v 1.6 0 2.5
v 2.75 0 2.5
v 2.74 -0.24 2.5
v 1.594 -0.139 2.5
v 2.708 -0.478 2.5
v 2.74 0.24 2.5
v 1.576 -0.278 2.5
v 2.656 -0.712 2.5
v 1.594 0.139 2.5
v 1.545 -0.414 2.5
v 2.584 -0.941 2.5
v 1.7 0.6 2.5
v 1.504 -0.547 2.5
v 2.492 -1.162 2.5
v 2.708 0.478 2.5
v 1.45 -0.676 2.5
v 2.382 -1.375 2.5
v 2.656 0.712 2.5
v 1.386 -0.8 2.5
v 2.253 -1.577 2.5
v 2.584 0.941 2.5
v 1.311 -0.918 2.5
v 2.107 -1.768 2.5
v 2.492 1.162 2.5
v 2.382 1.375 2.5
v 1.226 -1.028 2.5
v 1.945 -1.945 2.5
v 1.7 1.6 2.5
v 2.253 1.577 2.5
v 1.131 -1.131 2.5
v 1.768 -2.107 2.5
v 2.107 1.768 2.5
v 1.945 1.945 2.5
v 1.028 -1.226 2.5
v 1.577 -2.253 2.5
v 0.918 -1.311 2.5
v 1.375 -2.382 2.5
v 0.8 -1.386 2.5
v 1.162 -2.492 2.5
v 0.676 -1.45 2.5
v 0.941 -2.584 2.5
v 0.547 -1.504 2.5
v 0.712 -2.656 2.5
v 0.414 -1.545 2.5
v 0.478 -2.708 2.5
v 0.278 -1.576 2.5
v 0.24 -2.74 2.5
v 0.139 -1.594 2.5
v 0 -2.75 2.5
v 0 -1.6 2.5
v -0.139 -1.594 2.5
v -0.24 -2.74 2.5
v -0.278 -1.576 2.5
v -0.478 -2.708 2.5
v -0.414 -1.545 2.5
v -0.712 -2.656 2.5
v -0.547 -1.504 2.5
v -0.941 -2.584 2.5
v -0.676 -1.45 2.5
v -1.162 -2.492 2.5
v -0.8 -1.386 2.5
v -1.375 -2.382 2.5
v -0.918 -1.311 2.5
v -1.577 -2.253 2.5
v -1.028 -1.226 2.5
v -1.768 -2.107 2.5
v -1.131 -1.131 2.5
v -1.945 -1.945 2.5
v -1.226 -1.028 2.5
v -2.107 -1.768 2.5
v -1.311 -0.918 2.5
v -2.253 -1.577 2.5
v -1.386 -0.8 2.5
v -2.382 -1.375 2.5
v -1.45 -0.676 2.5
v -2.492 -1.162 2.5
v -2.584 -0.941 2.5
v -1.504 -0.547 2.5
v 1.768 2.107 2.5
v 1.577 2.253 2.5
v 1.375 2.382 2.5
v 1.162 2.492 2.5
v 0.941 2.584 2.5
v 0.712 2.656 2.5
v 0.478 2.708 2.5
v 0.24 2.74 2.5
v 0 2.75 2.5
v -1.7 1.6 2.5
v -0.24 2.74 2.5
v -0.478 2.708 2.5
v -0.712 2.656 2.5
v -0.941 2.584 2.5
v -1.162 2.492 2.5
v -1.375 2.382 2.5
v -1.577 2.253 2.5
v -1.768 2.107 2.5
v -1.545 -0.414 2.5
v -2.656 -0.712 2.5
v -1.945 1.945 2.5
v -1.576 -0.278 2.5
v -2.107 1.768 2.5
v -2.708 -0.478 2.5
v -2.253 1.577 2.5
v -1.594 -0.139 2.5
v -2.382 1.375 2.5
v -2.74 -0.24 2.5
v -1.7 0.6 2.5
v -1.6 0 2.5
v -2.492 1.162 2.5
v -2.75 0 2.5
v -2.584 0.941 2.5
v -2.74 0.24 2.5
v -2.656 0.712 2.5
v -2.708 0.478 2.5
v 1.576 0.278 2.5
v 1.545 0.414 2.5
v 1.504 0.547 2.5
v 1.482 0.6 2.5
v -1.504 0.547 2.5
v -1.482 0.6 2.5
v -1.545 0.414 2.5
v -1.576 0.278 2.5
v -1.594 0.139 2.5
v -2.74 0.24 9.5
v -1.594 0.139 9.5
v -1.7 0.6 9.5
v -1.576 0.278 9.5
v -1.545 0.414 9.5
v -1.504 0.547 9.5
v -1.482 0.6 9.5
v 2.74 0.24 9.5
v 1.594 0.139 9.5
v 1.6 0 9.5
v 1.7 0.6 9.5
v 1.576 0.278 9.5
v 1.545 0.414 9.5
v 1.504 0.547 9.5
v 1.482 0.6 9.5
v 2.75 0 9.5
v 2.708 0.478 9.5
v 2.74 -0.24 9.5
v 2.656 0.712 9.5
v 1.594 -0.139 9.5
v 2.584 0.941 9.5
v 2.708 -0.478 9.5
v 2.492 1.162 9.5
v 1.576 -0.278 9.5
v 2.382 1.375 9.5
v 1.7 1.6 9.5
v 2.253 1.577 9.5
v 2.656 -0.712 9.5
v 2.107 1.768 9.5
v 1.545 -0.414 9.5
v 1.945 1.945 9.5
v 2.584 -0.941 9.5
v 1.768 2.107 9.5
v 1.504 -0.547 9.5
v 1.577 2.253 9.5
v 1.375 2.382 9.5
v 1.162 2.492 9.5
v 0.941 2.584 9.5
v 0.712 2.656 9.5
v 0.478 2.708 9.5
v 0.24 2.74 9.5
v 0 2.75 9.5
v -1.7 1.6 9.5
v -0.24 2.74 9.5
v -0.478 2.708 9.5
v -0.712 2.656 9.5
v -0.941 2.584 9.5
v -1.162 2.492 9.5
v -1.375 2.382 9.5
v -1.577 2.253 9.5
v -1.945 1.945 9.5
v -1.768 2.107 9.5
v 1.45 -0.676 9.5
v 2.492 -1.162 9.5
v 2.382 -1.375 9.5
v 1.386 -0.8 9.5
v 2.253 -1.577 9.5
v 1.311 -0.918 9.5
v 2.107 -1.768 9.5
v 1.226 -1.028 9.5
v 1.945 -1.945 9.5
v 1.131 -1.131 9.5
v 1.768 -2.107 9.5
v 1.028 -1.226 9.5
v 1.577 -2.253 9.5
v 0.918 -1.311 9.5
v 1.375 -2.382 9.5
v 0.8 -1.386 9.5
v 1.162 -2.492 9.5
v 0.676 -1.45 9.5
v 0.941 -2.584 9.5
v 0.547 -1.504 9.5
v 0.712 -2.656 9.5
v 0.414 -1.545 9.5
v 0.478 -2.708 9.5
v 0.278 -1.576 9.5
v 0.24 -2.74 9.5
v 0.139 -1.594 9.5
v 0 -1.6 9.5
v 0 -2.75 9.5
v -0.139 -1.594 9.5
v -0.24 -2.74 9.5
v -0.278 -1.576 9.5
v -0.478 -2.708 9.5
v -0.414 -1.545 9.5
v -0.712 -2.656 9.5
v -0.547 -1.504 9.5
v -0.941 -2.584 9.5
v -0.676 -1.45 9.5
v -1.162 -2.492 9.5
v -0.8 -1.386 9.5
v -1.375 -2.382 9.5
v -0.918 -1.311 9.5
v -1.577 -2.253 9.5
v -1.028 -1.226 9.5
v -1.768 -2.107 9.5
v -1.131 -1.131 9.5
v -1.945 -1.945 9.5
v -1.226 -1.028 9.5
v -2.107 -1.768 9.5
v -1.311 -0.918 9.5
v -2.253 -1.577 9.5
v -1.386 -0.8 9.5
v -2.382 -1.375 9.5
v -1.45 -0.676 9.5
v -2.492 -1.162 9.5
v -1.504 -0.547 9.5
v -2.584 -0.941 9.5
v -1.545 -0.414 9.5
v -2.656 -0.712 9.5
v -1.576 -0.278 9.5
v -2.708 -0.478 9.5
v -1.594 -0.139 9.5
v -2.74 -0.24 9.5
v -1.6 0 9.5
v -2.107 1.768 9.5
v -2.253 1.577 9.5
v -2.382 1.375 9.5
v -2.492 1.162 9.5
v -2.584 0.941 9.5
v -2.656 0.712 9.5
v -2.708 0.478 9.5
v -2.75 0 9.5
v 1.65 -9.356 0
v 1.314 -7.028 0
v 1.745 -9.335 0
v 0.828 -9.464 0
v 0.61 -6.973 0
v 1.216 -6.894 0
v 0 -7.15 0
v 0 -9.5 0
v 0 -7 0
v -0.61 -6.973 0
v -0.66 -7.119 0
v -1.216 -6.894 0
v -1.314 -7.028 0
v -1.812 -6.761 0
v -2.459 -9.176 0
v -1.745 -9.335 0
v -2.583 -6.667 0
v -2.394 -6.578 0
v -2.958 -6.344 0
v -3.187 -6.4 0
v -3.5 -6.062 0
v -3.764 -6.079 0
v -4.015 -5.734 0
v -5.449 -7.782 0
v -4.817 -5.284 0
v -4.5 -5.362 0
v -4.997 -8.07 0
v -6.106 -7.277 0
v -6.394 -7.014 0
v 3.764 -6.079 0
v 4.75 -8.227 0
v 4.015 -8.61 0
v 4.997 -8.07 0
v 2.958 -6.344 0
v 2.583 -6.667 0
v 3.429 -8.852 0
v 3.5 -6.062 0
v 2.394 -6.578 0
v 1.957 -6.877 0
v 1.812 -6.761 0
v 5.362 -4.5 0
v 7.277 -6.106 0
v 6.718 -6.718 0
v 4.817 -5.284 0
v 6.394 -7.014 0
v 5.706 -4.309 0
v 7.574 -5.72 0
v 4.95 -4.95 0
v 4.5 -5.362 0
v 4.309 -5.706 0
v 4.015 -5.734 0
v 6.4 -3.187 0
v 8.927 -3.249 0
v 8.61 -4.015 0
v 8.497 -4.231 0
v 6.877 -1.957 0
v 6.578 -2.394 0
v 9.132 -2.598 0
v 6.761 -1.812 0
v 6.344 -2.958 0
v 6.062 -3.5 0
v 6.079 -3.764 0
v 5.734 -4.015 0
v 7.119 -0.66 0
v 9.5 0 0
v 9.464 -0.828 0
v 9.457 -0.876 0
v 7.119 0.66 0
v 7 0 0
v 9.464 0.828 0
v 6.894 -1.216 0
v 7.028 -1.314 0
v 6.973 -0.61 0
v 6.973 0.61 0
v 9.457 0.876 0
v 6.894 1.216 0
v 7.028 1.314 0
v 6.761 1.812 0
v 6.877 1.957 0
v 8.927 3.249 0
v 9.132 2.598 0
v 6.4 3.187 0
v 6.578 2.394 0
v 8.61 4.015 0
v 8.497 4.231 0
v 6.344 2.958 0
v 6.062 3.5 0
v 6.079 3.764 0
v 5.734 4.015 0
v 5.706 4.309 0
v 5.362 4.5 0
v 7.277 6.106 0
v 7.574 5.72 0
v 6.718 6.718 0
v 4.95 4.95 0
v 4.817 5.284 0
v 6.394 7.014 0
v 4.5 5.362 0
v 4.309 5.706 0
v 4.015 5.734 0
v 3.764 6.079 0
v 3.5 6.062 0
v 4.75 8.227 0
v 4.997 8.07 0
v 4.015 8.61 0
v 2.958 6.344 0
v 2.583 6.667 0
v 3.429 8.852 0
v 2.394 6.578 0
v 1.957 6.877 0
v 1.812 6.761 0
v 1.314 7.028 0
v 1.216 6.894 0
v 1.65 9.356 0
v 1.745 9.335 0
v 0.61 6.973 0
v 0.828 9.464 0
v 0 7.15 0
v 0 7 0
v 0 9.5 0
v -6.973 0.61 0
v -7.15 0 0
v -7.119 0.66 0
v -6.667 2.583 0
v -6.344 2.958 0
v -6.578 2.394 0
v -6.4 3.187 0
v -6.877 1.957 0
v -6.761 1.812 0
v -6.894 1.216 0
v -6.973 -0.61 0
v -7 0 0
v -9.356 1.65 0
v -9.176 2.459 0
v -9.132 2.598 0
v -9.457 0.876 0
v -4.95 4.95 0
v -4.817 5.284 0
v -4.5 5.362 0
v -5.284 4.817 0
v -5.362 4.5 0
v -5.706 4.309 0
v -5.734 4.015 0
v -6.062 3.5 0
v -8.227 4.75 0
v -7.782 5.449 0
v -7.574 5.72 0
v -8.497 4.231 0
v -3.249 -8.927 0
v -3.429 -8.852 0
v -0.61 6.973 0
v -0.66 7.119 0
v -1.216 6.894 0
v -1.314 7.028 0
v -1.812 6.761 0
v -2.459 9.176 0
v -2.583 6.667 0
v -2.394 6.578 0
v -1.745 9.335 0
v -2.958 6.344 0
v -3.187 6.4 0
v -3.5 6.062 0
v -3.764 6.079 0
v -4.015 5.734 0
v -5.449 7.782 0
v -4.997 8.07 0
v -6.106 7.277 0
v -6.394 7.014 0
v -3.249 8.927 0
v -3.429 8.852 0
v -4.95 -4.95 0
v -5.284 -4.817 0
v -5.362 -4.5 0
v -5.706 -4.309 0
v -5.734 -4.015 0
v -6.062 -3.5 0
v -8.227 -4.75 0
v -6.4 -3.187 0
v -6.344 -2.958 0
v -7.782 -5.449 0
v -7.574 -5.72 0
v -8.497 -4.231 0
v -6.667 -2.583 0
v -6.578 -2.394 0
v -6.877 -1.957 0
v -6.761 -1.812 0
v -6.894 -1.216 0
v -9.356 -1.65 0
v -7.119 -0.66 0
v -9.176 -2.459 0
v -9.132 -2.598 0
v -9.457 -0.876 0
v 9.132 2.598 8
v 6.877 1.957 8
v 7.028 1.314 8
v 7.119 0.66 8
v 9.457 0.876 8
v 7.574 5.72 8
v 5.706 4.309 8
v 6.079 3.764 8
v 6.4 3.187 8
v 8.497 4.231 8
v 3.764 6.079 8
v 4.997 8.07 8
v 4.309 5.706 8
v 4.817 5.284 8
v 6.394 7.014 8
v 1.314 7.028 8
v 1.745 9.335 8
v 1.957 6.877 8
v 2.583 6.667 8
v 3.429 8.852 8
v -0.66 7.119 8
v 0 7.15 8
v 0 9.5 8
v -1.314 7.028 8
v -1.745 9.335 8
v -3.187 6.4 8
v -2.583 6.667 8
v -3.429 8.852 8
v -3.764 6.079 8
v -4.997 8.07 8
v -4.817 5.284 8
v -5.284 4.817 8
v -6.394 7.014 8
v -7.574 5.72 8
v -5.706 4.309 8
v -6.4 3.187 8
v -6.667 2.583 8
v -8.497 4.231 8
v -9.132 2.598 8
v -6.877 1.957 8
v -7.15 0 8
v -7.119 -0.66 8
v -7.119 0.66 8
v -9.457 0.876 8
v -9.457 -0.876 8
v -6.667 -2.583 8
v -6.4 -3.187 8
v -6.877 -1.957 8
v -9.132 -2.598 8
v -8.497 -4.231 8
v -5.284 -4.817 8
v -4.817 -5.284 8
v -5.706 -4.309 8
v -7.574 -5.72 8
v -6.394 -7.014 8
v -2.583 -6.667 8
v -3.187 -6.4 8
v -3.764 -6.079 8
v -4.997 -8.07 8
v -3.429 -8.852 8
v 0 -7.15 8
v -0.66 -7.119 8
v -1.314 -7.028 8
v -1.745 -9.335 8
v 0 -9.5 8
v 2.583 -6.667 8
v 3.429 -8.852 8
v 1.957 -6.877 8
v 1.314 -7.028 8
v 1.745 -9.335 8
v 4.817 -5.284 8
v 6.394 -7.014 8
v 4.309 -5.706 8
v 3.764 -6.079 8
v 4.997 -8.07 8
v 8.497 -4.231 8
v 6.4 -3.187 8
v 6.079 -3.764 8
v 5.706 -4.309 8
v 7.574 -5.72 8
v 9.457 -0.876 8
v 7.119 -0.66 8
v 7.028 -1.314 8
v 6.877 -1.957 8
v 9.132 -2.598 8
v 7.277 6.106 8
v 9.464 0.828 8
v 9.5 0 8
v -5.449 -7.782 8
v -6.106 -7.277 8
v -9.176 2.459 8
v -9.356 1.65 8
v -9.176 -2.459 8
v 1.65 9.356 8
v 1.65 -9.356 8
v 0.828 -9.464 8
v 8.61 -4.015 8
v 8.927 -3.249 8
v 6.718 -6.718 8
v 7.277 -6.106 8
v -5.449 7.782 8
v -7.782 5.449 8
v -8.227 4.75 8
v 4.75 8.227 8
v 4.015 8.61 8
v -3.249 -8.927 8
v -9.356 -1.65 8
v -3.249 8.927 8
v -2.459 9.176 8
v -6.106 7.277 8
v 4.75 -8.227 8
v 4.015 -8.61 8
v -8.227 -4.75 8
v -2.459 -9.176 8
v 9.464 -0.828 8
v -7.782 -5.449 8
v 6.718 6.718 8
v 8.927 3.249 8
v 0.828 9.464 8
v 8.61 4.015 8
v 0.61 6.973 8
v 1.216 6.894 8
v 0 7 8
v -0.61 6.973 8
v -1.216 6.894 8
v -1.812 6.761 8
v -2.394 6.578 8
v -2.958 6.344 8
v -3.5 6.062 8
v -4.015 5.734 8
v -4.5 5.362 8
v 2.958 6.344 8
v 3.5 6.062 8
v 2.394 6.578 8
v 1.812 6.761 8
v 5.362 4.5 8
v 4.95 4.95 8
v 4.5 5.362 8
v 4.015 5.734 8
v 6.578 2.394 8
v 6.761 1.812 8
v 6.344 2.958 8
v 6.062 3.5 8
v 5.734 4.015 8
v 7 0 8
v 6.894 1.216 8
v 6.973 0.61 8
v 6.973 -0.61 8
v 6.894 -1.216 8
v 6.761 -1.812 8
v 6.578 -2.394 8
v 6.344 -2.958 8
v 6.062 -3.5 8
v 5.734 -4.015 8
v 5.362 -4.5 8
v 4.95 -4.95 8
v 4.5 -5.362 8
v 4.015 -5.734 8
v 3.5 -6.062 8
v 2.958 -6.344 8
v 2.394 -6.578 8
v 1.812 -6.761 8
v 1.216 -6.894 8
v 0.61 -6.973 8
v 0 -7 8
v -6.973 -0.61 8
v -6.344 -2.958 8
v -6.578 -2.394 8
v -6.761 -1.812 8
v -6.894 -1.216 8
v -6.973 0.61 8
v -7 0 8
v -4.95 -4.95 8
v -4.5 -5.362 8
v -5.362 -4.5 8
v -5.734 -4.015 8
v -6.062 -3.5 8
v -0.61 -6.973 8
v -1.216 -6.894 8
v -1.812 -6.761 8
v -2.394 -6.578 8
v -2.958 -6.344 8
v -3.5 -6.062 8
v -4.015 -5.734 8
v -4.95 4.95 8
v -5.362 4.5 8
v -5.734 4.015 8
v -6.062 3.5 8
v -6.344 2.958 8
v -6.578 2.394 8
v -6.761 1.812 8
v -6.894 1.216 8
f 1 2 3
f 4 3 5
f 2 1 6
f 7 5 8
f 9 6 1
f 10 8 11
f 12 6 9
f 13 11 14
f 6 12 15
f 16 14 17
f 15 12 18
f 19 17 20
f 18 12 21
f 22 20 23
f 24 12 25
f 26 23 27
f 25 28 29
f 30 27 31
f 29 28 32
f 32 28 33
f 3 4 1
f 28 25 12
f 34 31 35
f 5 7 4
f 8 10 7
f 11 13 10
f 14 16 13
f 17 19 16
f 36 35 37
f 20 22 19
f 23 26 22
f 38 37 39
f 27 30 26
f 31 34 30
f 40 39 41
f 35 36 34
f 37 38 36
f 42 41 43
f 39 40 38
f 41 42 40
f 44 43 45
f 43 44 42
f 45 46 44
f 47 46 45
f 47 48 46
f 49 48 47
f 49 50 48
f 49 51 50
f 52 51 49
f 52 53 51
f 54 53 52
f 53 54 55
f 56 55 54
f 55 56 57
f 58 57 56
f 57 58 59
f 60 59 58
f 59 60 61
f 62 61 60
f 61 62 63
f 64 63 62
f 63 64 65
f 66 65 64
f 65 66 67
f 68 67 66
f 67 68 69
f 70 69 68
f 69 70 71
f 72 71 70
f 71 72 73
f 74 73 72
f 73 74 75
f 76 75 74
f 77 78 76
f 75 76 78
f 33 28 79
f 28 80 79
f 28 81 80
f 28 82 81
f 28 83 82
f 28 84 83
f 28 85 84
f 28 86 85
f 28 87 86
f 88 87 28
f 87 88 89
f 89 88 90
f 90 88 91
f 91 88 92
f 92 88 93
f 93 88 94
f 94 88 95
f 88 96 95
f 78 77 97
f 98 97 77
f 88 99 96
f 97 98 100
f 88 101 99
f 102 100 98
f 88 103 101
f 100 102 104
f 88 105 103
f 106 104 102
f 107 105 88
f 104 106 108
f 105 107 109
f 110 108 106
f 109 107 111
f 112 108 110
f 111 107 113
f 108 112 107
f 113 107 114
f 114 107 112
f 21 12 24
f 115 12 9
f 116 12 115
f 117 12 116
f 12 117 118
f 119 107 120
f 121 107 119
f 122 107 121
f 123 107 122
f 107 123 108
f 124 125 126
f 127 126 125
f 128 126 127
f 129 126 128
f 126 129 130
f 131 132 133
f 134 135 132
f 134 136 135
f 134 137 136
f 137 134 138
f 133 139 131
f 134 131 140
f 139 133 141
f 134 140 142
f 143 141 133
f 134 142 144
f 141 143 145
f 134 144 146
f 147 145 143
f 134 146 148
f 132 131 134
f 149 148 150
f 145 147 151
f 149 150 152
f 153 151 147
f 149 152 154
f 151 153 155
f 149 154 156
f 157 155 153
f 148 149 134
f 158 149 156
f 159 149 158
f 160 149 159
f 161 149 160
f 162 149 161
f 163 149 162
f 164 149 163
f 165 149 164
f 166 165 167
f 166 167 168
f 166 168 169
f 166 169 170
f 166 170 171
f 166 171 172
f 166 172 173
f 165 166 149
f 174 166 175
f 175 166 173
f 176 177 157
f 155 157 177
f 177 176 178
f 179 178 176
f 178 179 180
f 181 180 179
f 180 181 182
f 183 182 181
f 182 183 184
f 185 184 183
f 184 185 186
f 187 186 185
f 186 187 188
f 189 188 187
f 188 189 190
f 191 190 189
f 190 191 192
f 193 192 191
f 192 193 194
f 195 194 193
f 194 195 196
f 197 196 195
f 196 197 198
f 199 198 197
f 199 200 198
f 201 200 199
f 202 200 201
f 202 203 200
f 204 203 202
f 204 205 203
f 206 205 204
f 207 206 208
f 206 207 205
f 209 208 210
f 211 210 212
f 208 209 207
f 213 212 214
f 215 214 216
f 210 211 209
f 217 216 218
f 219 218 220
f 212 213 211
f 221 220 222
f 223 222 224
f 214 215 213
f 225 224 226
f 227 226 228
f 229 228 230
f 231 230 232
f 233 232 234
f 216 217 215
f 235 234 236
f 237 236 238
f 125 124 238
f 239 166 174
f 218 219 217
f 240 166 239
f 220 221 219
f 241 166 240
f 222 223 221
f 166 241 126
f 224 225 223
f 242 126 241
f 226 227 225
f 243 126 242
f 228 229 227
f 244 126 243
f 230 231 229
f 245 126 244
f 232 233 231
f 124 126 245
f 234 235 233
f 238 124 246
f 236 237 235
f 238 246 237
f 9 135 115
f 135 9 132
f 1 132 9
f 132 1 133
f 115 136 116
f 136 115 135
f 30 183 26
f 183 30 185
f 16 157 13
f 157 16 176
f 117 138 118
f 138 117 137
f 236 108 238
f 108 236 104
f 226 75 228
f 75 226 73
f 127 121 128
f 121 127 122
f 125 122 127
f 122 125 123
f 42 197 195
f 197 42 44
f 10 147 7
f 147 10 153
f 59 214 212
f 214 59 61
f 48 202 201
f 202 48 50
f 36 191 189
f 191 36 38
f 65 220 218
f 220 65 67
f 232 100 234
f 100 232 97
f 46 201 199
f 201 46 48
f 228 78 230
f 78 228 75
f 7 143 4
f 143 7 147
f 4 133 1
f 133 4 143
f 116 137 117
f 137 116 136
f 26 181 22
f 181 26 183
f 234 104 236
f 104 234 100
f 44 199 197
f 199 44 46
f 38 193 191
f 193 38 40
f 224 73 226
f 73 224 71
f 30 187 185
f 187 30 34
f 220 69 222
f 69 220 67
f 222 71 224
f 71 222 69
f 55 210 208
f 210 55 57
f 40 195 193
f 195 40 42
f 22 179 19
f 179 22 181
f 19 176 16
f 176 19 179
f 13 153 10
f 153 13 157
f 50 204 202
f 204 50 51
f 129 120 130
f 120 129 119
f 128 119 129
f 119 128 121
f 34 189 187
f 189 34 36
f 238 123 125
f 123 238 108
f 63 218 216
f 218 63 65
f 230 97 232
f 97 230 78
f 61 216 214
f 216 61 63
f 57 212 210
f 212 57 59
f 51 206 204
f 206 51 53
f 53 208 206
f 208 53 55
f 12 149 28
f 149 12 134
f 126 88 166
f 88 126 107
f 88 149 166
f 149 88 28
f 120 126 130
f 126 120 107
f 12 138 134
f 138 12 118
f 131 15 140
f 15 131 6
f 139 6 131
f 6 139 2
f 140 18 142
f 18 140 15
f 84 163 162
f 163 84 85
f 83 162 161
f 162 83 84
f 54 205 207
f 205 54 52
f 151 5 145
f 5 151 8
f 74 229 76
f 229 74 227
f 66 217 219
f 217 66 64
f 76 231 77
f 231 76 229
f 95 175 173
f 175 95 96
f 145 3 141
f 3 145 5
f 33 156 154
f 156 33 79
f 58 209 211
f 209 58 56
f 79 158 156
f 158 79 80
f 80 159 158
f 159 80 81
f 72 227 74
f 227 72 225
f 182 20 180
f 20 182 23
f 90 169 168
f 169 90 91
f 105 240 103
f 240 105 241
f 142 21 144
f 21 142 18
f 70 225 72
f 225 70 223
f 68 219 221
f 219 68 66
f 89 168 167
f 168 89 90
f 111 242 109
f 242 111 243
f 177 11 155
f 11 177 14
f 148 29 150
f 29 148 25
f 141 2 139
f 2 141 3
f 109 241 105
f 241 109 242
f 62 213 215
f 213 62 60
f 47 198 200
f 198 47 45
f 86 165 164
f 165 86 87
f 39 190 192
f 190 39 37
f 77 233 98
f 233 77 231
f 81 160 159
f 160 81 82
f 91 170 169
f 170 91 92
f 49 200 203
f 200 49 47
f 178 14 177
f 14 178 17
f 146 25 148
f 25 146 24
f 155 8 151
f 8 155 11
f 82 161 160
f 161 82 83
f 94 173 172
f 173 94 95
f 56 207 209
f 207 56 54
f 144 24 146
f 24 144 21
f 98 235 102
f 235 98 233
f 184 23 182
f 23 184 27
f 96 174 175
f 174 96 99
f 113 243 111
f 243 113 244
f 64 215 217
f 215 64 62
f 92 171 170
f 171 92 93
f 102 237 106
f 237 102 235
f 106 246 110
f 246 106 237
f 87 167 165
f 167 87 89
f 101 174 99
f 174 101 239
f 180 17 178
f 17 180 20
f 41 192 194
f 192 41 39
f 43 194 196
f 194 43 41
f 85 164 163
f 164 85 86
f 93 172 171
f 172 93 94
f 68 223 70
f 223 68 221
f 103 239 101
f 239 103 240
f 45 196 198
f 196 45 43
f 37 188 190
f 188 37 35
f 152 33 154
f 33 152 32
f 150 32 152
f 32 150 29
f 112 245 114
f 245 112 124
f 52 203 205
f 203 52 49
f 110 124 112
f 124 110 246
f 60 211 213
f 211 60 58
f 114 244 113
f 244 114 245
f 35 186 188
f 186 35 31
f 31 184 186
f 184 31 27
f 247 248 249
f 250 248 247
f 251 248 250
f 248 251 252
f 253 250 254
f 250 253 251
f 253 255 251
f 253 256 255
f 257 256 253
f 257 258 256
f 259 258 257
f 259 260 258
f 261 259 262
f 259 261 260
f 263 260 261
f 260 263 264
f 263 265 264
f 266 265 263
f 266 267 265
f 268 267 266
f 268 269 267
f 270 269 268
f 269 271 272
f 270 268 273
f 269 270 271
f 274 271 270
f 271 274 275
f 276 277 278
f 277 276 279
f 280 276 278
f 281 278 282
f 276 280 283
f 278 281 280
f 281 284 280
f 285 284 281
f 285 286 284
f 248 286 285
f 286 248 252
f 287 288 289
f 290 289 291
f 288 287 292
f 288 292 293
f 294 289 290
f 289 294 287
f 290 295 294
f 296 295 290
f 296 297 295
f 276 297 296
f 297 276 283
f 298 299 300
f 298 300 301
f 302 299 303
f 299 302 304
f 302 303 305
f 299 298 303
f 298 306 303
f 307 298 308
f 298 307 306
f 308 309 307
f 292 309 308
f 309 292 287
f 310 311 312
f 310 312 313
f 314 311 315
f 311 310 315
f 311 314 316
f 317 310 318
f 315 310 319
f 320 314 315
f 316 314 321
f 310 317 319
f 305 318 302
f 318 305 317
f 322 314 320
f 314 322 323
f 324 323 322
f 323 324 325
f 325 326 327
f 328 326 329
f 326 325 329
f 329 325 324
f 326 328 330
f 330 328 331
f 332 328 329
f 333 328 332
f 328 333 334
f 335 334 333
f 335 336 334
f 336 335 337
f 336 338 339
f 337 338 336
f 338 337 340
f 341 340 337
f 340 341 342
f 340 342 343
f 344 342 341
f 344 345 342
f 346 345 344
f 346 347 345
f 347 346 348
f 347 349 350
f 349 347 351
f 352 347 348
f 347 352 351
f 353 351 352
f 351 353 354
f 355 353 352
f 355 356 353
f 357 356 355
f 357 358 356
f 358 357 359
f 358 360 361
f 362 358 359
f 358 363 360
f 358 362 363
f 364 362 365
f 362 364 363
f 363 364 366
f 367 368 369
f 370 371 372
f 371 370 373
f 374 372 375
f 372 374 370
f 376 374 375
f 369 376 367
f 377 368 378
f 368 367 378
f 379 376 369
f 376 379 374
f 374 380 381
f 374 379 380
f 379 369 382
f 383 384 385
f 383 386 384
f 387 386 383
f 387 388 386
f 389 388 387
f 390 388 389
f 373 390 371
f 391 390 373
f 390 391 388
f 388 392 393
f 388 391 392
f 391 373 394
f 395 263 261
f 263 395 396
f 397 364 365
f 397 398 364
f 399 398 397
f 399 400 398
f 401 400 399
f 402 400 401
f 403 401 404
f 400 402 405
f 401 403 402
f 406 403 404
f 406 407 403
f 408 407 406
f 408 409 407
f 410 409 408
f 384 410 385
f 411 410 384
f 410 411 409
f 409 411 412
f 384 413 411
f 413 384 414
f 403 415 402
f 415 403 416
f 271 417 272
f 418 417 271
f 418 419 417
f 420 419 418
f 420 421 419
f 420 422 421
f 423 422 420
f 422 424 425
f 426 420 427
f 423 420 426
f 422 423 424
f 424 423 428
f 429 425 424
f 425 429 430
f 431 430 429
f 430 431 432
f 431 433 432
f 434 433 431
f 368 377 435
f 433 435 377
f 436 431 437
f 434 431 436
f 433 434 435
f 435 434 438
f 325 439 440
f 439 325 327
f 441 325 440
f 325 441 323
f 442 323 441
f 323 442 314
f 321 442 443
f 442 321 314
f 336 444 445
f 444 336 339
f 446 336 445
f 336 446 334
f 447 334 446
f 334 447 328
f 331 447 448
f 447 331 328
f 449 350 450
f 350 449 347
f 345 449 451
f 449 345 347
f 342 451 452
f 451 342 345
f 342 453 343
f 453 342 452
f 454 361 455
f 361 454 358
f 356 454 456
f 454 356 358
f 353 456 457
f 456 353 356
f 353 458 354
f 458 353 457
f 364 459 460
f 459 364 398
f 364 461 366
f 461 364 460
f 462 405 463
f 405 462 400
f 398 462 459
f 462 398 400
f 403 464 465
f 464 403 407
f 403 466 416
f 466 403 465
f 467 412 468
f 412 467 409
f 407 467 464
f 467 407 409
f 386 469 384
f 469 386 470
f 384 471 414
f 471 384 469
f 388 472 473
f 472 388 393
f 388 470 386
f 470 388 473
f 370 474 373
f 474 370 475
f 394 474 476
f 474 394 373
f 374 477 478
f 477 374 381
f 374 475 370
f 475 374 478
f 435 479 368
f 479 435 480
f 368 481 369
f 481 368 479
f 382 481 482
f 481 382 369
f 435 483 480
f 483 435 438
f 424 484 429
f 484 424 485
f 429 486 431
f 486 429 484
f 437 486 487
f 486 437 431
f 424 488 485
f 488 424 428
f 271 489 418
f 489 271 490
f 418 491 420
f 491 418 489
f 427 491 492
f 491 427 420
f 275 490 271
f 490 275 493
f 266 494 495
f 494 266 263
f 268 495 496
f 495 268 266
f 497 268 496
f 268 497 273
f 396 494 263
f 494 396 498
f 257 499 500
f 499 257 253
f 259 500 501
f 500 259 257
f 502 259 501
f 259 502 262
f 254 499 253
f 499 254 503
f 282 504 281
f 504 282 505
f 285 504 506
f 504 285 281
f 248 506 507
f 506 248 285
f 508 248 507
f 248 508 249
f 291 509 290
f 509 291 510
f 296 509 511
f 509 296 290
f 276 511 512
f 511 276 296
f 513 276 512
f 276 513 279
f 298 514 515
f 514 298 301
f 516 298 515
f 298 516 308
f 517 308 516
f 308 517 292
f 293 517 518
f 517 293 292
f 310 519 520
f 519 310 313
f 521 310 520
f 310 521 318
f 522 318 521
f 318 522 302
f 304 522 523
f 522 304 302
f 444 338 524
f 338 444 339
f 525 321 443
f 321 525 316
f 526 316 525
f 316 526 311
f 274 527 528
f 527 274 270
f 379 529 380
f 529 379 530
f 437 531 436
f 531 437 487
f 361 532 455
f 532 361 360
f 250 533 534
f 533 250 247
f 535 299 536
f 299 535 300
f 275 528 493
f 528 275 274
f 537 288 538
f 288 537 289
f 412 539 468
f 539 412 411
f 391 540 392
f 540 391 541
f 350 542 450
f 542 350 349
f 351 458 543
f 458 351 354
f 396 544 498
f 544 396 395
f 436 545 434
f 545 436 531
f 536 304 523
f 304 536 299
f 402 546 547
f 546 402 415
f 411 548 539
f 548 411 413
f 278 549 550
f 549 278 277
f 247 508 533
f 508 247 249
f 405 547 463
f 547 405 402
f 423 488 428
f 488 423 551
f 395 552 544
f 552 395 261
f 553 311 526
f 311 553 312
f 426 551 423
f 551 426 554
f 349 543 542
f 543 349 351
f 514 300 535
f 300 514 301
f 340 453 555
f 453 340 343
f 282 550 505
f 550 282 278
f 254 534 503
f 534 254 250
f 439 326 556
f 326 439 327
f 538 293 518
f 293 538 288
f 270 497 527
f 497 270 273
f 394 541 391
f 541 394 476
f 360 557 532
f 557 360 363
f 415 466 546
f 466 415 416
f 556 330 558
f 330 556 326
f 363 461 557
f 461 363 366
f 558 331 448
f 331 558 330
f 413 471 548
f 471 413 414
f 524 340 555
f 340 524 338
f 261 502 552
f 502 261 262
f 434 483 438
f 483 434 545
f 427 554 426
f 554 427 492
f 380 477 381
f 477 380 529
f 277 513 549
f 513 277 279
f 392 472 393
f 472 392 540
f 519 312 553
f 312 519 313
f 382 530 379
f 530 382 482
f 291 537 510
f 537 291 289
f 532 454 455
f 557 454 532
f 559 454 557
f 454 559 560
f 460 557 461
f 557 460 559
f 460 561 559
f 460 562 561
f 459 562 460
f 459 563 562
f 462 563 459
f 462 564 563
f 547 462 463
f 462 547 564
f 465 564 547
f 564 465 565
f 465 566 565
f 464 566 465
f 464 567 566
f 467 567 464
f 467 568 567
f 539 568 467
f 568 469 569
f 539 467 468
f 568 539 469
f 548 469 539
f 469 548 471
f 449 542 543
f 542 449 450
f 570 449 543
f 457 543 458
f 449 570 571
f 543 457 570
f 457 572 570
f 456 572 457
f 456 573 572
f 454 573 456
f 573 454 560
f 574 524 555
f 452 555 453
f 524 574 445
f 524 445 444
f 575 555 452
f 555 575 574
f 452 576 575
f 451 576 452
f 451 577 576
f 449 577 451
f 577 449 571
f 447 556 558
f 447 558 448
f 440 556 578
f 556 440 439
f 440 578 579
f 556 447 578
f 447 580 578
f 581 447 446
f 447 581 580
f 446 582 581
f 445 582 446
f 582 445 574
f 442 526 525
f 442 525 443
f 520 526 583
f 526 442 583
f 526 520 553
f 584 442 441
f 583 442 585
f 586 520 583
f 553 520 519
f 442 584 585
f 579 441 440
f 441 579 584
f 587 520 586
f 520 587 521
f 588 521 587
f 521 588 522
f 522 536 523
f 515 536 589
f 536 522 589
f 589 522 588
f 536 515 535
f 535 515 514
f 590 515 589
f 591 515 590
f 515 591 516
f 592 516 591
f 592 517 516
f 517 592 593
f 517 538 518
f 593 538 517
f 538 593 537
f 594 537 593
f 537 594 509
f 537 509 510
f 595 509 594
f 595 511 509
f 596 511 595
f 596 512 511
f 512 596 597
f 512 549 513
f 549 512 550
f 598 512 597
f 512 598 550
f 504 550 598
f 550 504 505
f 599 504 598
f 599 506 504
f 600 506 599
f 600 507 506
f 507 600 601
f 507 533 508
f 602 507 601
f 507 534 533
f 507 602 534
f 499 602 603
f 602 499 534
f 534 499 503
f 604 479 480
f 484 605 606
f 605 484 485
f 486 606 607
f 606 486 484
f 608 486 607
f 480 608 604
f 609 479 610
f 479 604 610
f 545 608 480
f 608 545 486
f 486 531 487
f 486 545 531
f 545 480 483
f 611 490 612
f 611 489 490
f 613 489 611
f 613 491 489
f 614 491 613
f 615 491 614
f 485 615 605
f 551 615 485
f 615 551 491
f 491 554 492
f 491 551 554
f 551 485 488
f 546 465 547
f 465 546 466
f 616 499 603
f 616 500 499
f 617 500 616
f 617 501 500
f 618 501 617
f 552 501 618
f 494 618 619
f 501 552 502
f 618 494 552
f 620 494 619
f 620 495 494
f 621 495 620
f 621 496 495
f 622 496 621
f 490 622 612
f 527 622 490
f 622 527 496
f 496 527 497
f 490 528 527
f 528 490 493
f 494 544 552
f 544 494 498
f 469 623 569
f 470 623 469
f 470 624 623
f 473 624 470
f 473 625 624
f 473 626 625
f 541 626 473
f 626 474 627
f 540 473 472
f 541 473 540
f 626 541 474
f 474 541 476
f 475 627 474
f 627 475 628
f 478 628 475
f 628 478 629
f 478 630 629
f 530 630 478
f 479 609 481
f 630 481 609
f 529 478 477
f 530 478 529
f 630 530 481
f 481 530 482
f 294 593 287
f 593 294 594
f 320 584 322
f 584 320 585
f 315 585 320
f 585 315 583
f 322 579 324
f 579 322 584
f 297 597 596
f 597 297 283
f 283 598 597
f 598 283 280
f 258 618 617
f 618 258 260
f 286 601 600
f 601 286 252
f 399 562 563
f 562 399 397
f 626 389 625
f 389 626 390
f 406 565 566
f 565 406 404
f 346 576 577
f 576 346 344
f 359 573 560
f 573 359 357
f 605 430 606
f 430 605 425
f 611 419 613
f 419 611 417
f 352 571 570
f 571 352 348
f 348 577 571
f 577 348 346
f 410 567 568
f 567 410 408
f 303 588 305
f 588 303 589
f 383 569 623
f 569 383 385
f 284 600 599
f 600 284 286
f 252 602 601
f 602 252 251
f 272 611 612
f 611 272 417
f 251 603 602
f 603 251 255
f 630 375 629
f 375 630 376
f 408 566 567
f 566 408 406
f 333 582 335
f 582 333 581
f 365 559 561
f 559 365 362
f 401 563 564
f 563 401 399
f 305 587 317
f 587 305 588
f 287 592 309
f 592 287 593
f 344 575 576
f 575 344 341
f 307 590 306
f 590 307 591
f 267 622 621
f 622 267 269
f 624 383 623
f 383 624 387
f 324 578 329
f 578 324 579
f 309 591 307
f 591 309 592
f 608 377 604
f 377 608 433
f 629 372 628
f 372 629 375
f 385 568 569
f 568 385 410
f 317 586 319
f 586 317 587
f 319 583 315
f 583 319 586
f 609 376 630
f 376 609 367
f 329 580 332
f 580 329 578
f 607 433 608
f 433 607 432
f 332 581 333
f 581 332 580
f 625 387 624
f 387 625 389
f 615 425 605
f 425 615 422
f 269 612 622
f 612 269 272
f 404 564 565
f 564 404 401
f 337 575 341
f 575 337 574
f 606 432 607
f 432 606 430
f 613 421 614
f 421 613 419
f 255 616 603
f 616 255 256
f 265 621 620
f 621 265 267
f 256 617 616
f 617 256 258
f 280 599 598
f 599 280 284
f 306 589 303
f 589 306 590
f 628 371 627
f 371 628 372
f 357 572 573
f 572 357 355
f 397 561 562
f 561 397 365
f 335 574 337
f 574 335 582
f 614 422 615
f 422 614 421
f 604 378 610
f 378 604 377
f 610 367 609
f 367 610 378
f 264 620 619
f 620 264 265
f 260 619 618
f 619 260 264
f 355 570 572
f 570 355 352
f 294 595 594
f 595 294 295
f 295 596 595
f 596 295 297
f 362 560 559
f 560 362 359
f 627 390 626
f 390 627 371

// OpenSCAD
// ===========================================================================
// HULL-FRAME COORDINATE STANDARD - Rev R1 (2026-06-11).  See CLAUDE.md.
//   Hull frame (canonical for ALL design artifacts): X = +port (left),
//   Y = +aft (back), Z = +dorsal (up); origin = SerenityAssembly.FCStd
//   world origin.  Primary-component STLs published to airframe/stls/
//   are stored directly in hull frame, baked by tools/bake_hull_frame.py
//   (marker 'SerenityUAV HULL-FRAME R1' in the binary STL header).
//   NEVER re-bake a mesh derived from an already-baked file.
//   This file:
//     Part-local print frame, coaxial with the nacelle duct (duct axis =
//     local +Z, intake at Z = 0).  Hull placement derives from the nacelle
//     pose (cruise = 270 deg about +X + translation; hover rotates about the
//     tilt pivot at duct Z = 83 mm).  Assembly placement VERIFY pending
//     (serenity_assembly.py).
// ===========================================================================
// nacelle_pinion.scad
// Serenity UAV Rev R — Nacelle Tilt Linkage, Drive Pinion A & Crown Pinion
//
// Purpose:
//   Two spur pinions (one SCAD, two PINION_VARIANT builds — no longer
//   dimensionally identical as of Rev S1) used at different positions in the
//   nacelle tilt-to-nozzle gear train:
//
//     Drive Pinion A (M1.0, 17T, R8.5) — mounted on the nacelle tilt shaft;
//       meshes with the fixed sector gear (nacelle_sector_gear.scad).  The
//       sector gear is centred ON the tilt pivot axis and does not rotate,
//       while Pinion A is carried by the nacelle and orbits the pivot axis
//       as the nacelle tilts -- this is an epicyclic (sun-fixed/planet-on-
//       carrier) mesh, NOT a simple two-gear mesh.  As the nacelle tilts
//       0-90 deg, Pinion A rotates 322.94 deg on its shaft (see "Gear ratio
//       context" below).  Shaft is transverse; Pinion A's output shaft
//       passes into Bevel Gear A (nacelle_bevel_pair.scad).
//
//     Nozzle Drive Pinion (M0.5, 14T, R3.5; called "Crown Pinion" through
//       Rev R1) — mounted on the longitudinal shaft (nacelle Z-axis) at the
//       nozzle end; meshes the INTERNAL nozzle ring gear (136T M0.5, pitch
//       R = 34, nacelle_nozzle_iris.scad) directly, at the 30.5 mm centre
//       distance set by shaft-conduit continuity through the bevel pair.
//       Drives ring rotation of ≈ 38.3° over the full -5°/140° tilt range
//       (23.75° over 0-90°; see "Gear ratio context" below).  The Rev R1
//       compound idler stage is DELETED (docs/NOZZLE_DRIVE_TRADE.md).
//
// Gear ratio context:
//   Stage 1 (Sector -> Pinion A) is EPICYCLIC, not a simple mesh: the
//   sector gear (sun) is fixed and centred on the tilt pivot axis; Pinion A
//   (planet) is carried by the nacelle (carrier) and orbits the pivot axis
//   as the nacelle tilts.  Rolling-without-slip contact-point velocity
//   matching at the mesh point (sector surface velocity = 0, since the
//   sector is fixed) gives the standard sun-fixed epicyclic relation:
//     omega_pinionA = omega_nacelle x (1 + R_sector / R_pinionA)
//                   = omega_nacelle x (1 + 22/8.5) = omega_nacelle x 3.5882
//   For a 90 deg nacelle tilt: theta_pinionA = 90 x 3.5882 = 322.94 deg.
//   (The naive simple-mesh ratio OMITS the "+1" orbital term and is WRONG
//   for this topology -- corrected 2026-06-22.)
//
//   Stage 2 (Bevel Gear A -> Bevel Gear B, nacelle_bevel_pair.scad) is a
//   10T:14T fixed-axis reducing bevel pair (Rev S1; was 1:1 through R1):
//     theta_shaft = theta_pinionA x (10/14) = 230.67 deg per 90 deg tilt.
//   The Nozzle Drive Pinion is rigidly keyed to the same shaft as Bevel B.
//
//   Stage 3 (Nozzle Drive Pinion -> INTERNAL nozzle ring, Rev S1) is a
//   single direct internal mesh (both carried by the nacelle):
//     theta_ring = theta_shaft x (R_drive / R_ring)
//                = theta_shaft x (3.5 / 34)  =  23.75 deg per 90 deg tilt.
//   The internal-mesh centre distance R_ring - R_drive = 34 - 3.5 = 30.5 mm
//   EQUALS the sector-mesh centre distance R_sector + R_pinionA = 22 + 8.5,
//   so both pinions, the bevel pair, and the longitudinal shaft all sit on
//   the single Y = 30.5 mm station (straight shaft-conduit path preserved).
//   The Rev R1 compound idler chain (420 deg / 17.6 = 23.86 deg via
//   nacelle_nozzle_idler.scad) is superseded: its Idler-In wheel's teeth
//   reached R≈51 mm — ~10 mm PAST the nacelle OD.  Trade study and
//   decision: docs/NOZZLE_DRIVE_TRADE.md (user selected the internal-ring
//   gear option, 2026-07-07).
//
// Mating interfaces:
//   Drive Pinion A ("A"):
//     • Sector gear (nacelle_sector_gear.scad):
//         Mesh at pitch circles: sector R = 22 mm, pinion R = 8.5 mm.
//         Centre distance = 30.5 mm nominal; 30.6 mm installed (0.10 mm backlash).
//     • Bevel Gear A shaft bore (nacelle_bevel_pair.scad): 3 mm CF shaft.
//     • MR63ZZ bearings (×2): 3 mm ID × 6 mm OD × 2.5 mm; press-fit in-gear.
//   Nozzle Drive Pinion ("DRIVE"):
//     • INTERNAL nozzle ring gear (nacelle_nozzle_iris.scad):
//         Mesh at pitch circles: drive pinion R = 3.5 mm, ring R = 34 mm.
//         Internal-mesh centre distance = 30.5 mm nominal.
//     • No in-gear bearings (hub too small for MR63ZZ) — shaft rides the
//       pod's crown_pinion_boss bearings (nacelle_pod_50mm_tandem.scad).
//     • Longitudinal shaft: 3 mm CF tube.
//
// COTS note (Rev S1): both variants are deliberately at COMMODITY sizes —
//   M1.0 17T and M0.5 14T spur pinions with 3 mm bores are stock hobby /
//   gearmotor items in steel, brass, and POM.  A purchased metal pinion
//   (grub-screw hub) is PREFERRED over the printed part for wear; record
//   verified part numbers in the BOM before flight builds (TODO §1.1.3.3).
//
// Gear standard: AGMA/ISO involute, Pressure angle 20°; Module per variant.
// Tooth profile: tooth-space subtraction method (annular-wedge polygons).
//
// Shaft key: 1 mm flat chord cut (D-profile bore) on inner bore for
//   anti-rotation keying to the 3 mm CF shaft.
//
// Print specification:
//   Preferred:  SLA resin, ≤ 0.05 mm layer height.
//   Backup:     CF-PETG FDM, 0.10 mm layers, 4 perimeters, 60 % infill.
//   Orientation: Print with shaft bore vertical (tooth faces outward).
//   Post-process: Lightly ream shaft bore with 3.0 mm drill bit before assembly.
//   Bearing seats: Press fit; lightly sand if MR63ZZ does not seat by hand.
//
// Author:  Steve Griffing, PE(CSE), CISSP-ISSEP, CPP
// License: CC BY 4.0  <https://creativecommons.org/licenses/by/4.0/>
// Date:    2026-05-24
// Rev:     R (2026-06-11): Rev R baseline — no geometry changes (carried forward from Rev O initial release).
// Rev:     R1 (2026-06-22): Corrected Drive Pinion A rotation comment (330 deg
//          -> 420 deg): the original figure used the naive simple-mesh ratio
//          (Rs/Rp), omitting the "+1" orbital term required because the
//          sector gear (sun) is fixed and centred on the tilt pivot while
//          Pinion A (planet) is carried by the nacelle -- an epicyclic, not
//          simple, mesh.  No geometry changed, comment-only fix.
// Rev:     R1.1 (2026-06-22): Resolved the Stage 3 (Crown Pinion -> Nozzle
//          Ring) open issue: replaced the direct Crown-Pinion-to-rack mesh
//          with a compound idler gear stage (nacelle_nozzle_idler.scad, new
//          file), decoupling the Crown Pinion's fixed 28 mm hull-frame
//          offset from the nozzle ring's required pitch radius.  Rewrote
//          "Gear ratio context" Stage 3 derivation, Mating Interfaces, and
//          Fit Confirmation table accordingly.  No geometry change to this
//          file's own pinions; comment/documentation update only.

// ── Resolution ────────────────────────────────────────────────────────────────

$fn = 72;   // standard circle resolution

// ── Variant Selection (Rev S1, 2026-07-07) ────────────────────────────────────
// The two pinions are no longer dimensionally identical (Rev S1 internal-ring
// nozzle drive — see docs/NOZZLE_DRIVE_TRADE.md):
//   "A"     — Drive Pinion A: M1.0, 17T, R = 8.5 mm.  Meshes the fixed sector
//             gear (R = 22) at centre distance 30.5 mm (= PINION_A_Y).
//   "DRIVE" — Nozzle Drive Pinion (replaces the "Crown Pinion"): M0.5, 14T,
//             R = 3.5 mm.  Meshes the INTERNAL nozzle ring gear (136T M0.5,
//             pitch R = 34, nacelle_nozzle_iris.scad) at centre distance
//             34 − 3.5 = 30.5 mm — the SAME shaft station as Pinion A,
//             preserving the straight pinion-A → bevel → longitudinal-shaft
//             conduit through the nacelle.
// Override at CLI:  openscad -D 'PINION_VARIANT="DRIVE"' ...
PINION_VARIANT  = "A";    // "A" | "DRIVE"

// ── Gear Parameters ───────────────────────────────────────────────────────────

MODULE          = (PINION_VARIANT == "DRIVE") ? 0.5 : 1.0;
                          // [mm] AGMA Module.  M0.5 on the DRIVE pinion is
                          //   forced by packaging: the nozzle annulus between
                          //   throat OD (R27.5) and housing bore (R37.5) is
                          //   only ~9 mm wide, so an M1 pinion (OD ≥ 14 mm)
                          //   cannot fit.  SLA print (already the preferred
                          //   process for these gears) is REQUIRED for M0.5.
PRESSURE_ANGLE  = 20.0;   // [deg] standard involute pressure angle
N_TEETH         = (PINION_VARIANT == "DRIVE") ? 14 : 17;
                          // [count] A: 17T (R8.5, no undercut at 20° PA);
                          //   DRIVE: 14T (R3.5 — mild undercut at 20° PA is
                          //   tolerated by the trapezoidal tooth-space
                          //   approximation used here; drive torque is small)

// ── Derived Gear Geometry ─────────────────────────────────────────────────────

PITCH_R    = N_TEETH * MODULE / 2;          // [mm] = 6.0  pitch circle radius
TIP_R      = PITCH_R + MODULE;              // [mm] = 7.0  addendum circle
ROOT_R     = PITCH_R - 1.25 * MODULE;      // [mm] = 4.75 dedendum (root) circle
BASE_R     = PITCH_R * cos(PRESSURE_ANGLE); // [mm] ≈ 5.638 base circle

// Full-circle angular pitch (angle per tooth + space):
ANGULAR_PITCH = 360.0 / N_TEETH;   // [deg] = 30.0° per tooth

// Half-angle of one tooth space at pitch circle (equal tooth and space widths):
SPACE_HALF_ANG = ANGULAR_PITCH / 4;  // [deg] = 7.5° (quarter of angular pitch)

// ── Shaft and Bearing Parameters ──────────────────────────────────────────────

PINION_H        = (PINION_VARIANT == "DRIVE") ? 4.0 : 8.0;
                        // [mm] tooth face width.  A: 8.0 (= 2 × MR63ZZ axial
                        //   width + 3 mm gap).  DRIVE: 4.0 — matches the
                        //   internal ring's gear-band height (RING_GEAR_BAND_H
                        //   = 4.5 in nacelle_nozzle_iris.scad, 0.5 axial clr).
HAS_BEARING_SEATS = (PINION_VARIANT != "DRIVE");
                        // The DRIVE pinion's root circle (Ø 5.75) is smaller
                        //   than the MR63ZZ seat bore (Ø 6.05), so it cannot
                        //   host bearings — it is keyed directly to the 3 mm
                        //   shaft, whose bearings live in the pod's
                        //   crown_pinion_boss (nacelle_pod_50mm_tandem.scad).
SHAFT_BORE      =  3.2;   // [mm] MR63ZZ inner bore ID 3 mm + 0.2 mm clearance
SHAFT_KEY_W     =  1.0;   // [mm] flat key chord width (D-profile anti-rotation)
HUB_OD          =  5.5;   // [mm] hub outer diameter (seats between bearings)
HUB_EXTENSION   =  2.0;   // [mm] hub extension beyond tooth face each side
                        //   provides bearing seat shoulder; total shaft span
                        //   = PINION_H + 2 × HUB_EXTENSION = 12.0 mm

// Bearing seat dimensions (MR63ZZ: 3 mm ID, 6 mm OD, 2.5 mm wide):
BEARING_OD      =  6.0;   // [mm] MR63ZZ outer diameter
BEARING_W       =  2.5;   // [mm] MR63ZZ axial width
BEARING_SEAT_D  =  6.05;  // [mm] press-fit bore for MR63ZZ (6 mm OD + 0.05 mm
                        //   interference — resin/PETG elastic enough to seat)

// ── Module Definitions ────────────────────────────────────────────────────────

// tooth_space_pinion(i) — subtract one tooth-space gap from the pinion blank.
//
//   For a 12-tooth pinion the angular pitch is 30°.  Each tooth space is a thin
//   wedge centred between two adjacent tooth centrelines.
//
//   Arguments:
//     i — tooth-space index (0-based); space between tooth i and tooth i+1
// Rev S1 BUG FIX (2026-07-07): the original construction masked the annulus
// with two rotated first-quadrant squares — that removes only the arcs
// (2·half_ang..90°+2·half_ang) and (180°..270°), leaving ~155° of EXTRA arc
// in every "tooth space" cut.  Overlapping cuts consumed ALL teeth: every
// previously published pinion STL was a toothless blank at the root circle
// (verified: archived nacelle_pinion.stl max radius = ROOT_R − 0.1 exactly).
// Replaced with the closed annular-wedge polygon method already used (and
// proven) by nacelle_sector_gear.scad and the nozzle ring.

// arc_pts(r, a1, a2, n) — n+1 points along an arc at radius r from a1 to a2.
function arc_pts(r, a1, a2, n) =
    [for (i = [0 : n]) let(a = a1 + i * (a2 - a1) / n) [r * cos(a), r * sin(a)]];

// annular_wedge(r_in, r_out, a1, a2, n) — closed annular-sector polygon.
function annular_wedge(r_in, r_out, a1, a2, n) =
    concat(arc_pts(r_in,  a1, a2, n),
            arc_pts(r_out, a2, a1, n));

module tooth_space_pinion(i) {
    // Angular centre of this space (midpoint between tooth i and tooth i+1):
    space_centre = i * ANGULAR_PITCH + ANGULAR_PITCH / 2;

    // Half-angular width of the tooth space (quarter of the angular pitch —
    // equal tooth and space widths at the pitch circle):
    half_ang = SPACE_HALF_ANG;

    linear_extrude(height = PINION_H + 0.2) {
        polygon(annular_wedge(
            ROOT_R - 0.1, TIP_R + 0.2,
            space_centre - half_ang, space_centre + half_ang,
            2   // 2 segments per arc edge (spaces are only a few deg wide)
        ));
    }
}

// shaft_bore_with_key() — D-profile bore for 3 mm CF shaft + 1 mm flat key.
//
//   The "D" flat is a chord cut at distance (SHAFT_BORE/2 - SHAFT_KEY_W) from
//   the bore centre, removing a thin sliver from the circular bore to create a
//   flat that keys into a matching flat filed/milled on the CF shaft.
module shaft_bore_with_key() {
    union() {
        // Circular bore — 3.2 mm clearance
        cylinder(h = PINION_H + 2 * HUB_EXTENSION + 0.2,
                d = SHAFT_BORE,
                center = true);

        // Key flat: subtract by intersecting with a box that cuts the flat side.
        // The flat is at Y = -(SHAFT_BORE/2 - SHAFT_KEY_W) from bore centre.
        // Implemented as a "negative box" that removes the cylinder segment.
        // Here we ADD a slot cut via difference in the parent module.
        // The flat chord: X spans full bore width, Y is a thin slab.
        translate([0, SHAFT_BORE / 2 - SHAFT_KEY_W / 2, 0])
            cube([SHAFT_BORE + 0.2,
                SHAFT_KEY_W,
                PINION_H + 2 * HUB_EXTENSION + 0.2],
                center = true);
    }
}

// hub_body() — solid hub cylinder with bearing seat bores at each end.
//   The hub spans PINION_H + 2 × HUB_EXTENSION along the shaft axis.
//   Two MR63ZZ bearing seats are bored into each axial end face.
module hub_body() {
    total_h = PINION_H + 2 * HUB_EXTENSION;   // [mm] = 12.0

    difference() {
        // Outer hub cylinder
        cylinder(h = total_h, d = HUB_OD, center = true);

        // Bearing seats (variant "A" only — the DRIVE pinion's hub is too
        // small for MR63ZZ seats; see HAS_BEARING_SEATS above):
        if (HAS_BEARING_SEATS) {
            // Bearing seat — bottom end (Z = -total_h/2)
            translate([0, 0, -total_h / 2 - 0.1])
                cylinder(h = BEARING_W + 0.1, d = BEARING_SEAT_D);

            // Bearing seat — top end (Z = +total_h/2)
            translate([0, 0, total_h / 2 - BEARING_W])
                cylinder(h = BEARING_W + 0.1, d = BEARING_SEAT_D);
        }

        // Shaft bore with D-key (centred on hub)
        shaft_bore_with_key();
    }
}

// pinion_teeth_ring() — annular tooth ring, height = PINION_H.
//   Built by starting with a solid disk of TIP_R diameter and subtracting
//   N_TEETH tooth-space wedges.
module pinion_teeth_ring() {
    difference() {
        // Solid disk from root to tip radius
        cylinder(h = PINION_H, d = TIP_R * 2, center = false);

        // Subtract inner bore region (hub handles the inner volume)
        cylinder(h = PINION_H + 0.2, d = ROOT_R * 2 - 0.5, center = false);

        // Subtract all N_TEETH tooth spaces
        for (i = [0 : N_TEETH - 1]) {
            tooth_space_pinion(i);
        }
    }
}

// drive_pinion_a() — Drive Pinion A: meshes with fixed sector gear.
//   Installation axis: transverse (nacelle Y-axis).
//   Assembled flush with Bevel Gear A on the same shaft.
//   Origin: centre of gear face, Z = 0 at inboard bearing seat face.
module drive_pinion_a() {
    union() {
        // Hub (bearing seats + shaft bore), centred on Z = PINION_H/2 + HUB_EXTENSION
        translate([0, 0, PINION_H / 2 + HUB_EXTENSION])
            hub_body();

        // Tooth ring at Z = 0 to Z = PINION_H
        pinion_teeth_ring();
    }
}

// nozzle_drive_pinion() — Nozzle Drive Pinion (Rev S1; replaces "Crown
//   Pinion").  Renders correctly only with PINION_VARIANT = "DRIVE".
//   Installation axis: longitudinal (nacelle Z-axis), at nozzle end of shaft.
//   Meshes the INTERNAL nozzle ring gear (136T M0.5 pitch R=34,
//   nacelle_nozzle_iris.scad) at 30.5 mm centre distance, gear band seated
//   in the ring's gear band (iris local Z 0..4.5).
//   Origin: same as drive_pinion_a().
module nozzle_drive_pinion() {
    // Same construction; dimensions switch on PINION_VARIANT
    drive_pinion_a();
}

// ── Fit Confirmation ──────────────────────────────────────────────────────────
//
//   Interface               Mating part                   Clearance / fit
//   ──────────────────────  ────────────────────────────  ─────────────────────
//   Tooth pitch R = 6 mm    Sector gear pitch R = 22 mm   0.10 mm backlash
//   (Drive Pinion A)        nacelle_sector_gear.scad       (Δ centre distance)
//   Tooth pitch R = 6 mm    Idler-In pitch R = 22 mm      0.10 mm backlash
//   (Crown Pinion)          nacelle_nozzle_idler.scad      (Δ centre distance)
//   SHAFT_BORE 3.2 mm       3 mm CF shaft                  0.2 mm diametral clr
//   BEARING_SEAT_D 6.05 mm  MR63ZZ OD 6.0 mm              0.05 mm interference
//                                                           (press fit in PETG)
//   HUB_EXTENSION 2.0 mm    Bevel housing bore shoulder    face contact stop

// ── Render ────────────────────────────────────────────────────────────────────
//
// Export each variant via the CLI define (Rev S1):
//   Pinion A (M1 17T):
//     openscad -o airframe/stls/nacelles/nacelle_pinion_a.stl \
//              nacelle_pinion.scad -D 'PINION_VARIANT="A"'
//   Nozzle Drive Pinion (M0.5 14T):
//     openscad -o airframe/stls/nacelles/nacelle_drive_pinion.stl \
//              nacelle_pinion.scad -D 'PINION_VARIANT="DRIVE"'
drive_pinion_a();
